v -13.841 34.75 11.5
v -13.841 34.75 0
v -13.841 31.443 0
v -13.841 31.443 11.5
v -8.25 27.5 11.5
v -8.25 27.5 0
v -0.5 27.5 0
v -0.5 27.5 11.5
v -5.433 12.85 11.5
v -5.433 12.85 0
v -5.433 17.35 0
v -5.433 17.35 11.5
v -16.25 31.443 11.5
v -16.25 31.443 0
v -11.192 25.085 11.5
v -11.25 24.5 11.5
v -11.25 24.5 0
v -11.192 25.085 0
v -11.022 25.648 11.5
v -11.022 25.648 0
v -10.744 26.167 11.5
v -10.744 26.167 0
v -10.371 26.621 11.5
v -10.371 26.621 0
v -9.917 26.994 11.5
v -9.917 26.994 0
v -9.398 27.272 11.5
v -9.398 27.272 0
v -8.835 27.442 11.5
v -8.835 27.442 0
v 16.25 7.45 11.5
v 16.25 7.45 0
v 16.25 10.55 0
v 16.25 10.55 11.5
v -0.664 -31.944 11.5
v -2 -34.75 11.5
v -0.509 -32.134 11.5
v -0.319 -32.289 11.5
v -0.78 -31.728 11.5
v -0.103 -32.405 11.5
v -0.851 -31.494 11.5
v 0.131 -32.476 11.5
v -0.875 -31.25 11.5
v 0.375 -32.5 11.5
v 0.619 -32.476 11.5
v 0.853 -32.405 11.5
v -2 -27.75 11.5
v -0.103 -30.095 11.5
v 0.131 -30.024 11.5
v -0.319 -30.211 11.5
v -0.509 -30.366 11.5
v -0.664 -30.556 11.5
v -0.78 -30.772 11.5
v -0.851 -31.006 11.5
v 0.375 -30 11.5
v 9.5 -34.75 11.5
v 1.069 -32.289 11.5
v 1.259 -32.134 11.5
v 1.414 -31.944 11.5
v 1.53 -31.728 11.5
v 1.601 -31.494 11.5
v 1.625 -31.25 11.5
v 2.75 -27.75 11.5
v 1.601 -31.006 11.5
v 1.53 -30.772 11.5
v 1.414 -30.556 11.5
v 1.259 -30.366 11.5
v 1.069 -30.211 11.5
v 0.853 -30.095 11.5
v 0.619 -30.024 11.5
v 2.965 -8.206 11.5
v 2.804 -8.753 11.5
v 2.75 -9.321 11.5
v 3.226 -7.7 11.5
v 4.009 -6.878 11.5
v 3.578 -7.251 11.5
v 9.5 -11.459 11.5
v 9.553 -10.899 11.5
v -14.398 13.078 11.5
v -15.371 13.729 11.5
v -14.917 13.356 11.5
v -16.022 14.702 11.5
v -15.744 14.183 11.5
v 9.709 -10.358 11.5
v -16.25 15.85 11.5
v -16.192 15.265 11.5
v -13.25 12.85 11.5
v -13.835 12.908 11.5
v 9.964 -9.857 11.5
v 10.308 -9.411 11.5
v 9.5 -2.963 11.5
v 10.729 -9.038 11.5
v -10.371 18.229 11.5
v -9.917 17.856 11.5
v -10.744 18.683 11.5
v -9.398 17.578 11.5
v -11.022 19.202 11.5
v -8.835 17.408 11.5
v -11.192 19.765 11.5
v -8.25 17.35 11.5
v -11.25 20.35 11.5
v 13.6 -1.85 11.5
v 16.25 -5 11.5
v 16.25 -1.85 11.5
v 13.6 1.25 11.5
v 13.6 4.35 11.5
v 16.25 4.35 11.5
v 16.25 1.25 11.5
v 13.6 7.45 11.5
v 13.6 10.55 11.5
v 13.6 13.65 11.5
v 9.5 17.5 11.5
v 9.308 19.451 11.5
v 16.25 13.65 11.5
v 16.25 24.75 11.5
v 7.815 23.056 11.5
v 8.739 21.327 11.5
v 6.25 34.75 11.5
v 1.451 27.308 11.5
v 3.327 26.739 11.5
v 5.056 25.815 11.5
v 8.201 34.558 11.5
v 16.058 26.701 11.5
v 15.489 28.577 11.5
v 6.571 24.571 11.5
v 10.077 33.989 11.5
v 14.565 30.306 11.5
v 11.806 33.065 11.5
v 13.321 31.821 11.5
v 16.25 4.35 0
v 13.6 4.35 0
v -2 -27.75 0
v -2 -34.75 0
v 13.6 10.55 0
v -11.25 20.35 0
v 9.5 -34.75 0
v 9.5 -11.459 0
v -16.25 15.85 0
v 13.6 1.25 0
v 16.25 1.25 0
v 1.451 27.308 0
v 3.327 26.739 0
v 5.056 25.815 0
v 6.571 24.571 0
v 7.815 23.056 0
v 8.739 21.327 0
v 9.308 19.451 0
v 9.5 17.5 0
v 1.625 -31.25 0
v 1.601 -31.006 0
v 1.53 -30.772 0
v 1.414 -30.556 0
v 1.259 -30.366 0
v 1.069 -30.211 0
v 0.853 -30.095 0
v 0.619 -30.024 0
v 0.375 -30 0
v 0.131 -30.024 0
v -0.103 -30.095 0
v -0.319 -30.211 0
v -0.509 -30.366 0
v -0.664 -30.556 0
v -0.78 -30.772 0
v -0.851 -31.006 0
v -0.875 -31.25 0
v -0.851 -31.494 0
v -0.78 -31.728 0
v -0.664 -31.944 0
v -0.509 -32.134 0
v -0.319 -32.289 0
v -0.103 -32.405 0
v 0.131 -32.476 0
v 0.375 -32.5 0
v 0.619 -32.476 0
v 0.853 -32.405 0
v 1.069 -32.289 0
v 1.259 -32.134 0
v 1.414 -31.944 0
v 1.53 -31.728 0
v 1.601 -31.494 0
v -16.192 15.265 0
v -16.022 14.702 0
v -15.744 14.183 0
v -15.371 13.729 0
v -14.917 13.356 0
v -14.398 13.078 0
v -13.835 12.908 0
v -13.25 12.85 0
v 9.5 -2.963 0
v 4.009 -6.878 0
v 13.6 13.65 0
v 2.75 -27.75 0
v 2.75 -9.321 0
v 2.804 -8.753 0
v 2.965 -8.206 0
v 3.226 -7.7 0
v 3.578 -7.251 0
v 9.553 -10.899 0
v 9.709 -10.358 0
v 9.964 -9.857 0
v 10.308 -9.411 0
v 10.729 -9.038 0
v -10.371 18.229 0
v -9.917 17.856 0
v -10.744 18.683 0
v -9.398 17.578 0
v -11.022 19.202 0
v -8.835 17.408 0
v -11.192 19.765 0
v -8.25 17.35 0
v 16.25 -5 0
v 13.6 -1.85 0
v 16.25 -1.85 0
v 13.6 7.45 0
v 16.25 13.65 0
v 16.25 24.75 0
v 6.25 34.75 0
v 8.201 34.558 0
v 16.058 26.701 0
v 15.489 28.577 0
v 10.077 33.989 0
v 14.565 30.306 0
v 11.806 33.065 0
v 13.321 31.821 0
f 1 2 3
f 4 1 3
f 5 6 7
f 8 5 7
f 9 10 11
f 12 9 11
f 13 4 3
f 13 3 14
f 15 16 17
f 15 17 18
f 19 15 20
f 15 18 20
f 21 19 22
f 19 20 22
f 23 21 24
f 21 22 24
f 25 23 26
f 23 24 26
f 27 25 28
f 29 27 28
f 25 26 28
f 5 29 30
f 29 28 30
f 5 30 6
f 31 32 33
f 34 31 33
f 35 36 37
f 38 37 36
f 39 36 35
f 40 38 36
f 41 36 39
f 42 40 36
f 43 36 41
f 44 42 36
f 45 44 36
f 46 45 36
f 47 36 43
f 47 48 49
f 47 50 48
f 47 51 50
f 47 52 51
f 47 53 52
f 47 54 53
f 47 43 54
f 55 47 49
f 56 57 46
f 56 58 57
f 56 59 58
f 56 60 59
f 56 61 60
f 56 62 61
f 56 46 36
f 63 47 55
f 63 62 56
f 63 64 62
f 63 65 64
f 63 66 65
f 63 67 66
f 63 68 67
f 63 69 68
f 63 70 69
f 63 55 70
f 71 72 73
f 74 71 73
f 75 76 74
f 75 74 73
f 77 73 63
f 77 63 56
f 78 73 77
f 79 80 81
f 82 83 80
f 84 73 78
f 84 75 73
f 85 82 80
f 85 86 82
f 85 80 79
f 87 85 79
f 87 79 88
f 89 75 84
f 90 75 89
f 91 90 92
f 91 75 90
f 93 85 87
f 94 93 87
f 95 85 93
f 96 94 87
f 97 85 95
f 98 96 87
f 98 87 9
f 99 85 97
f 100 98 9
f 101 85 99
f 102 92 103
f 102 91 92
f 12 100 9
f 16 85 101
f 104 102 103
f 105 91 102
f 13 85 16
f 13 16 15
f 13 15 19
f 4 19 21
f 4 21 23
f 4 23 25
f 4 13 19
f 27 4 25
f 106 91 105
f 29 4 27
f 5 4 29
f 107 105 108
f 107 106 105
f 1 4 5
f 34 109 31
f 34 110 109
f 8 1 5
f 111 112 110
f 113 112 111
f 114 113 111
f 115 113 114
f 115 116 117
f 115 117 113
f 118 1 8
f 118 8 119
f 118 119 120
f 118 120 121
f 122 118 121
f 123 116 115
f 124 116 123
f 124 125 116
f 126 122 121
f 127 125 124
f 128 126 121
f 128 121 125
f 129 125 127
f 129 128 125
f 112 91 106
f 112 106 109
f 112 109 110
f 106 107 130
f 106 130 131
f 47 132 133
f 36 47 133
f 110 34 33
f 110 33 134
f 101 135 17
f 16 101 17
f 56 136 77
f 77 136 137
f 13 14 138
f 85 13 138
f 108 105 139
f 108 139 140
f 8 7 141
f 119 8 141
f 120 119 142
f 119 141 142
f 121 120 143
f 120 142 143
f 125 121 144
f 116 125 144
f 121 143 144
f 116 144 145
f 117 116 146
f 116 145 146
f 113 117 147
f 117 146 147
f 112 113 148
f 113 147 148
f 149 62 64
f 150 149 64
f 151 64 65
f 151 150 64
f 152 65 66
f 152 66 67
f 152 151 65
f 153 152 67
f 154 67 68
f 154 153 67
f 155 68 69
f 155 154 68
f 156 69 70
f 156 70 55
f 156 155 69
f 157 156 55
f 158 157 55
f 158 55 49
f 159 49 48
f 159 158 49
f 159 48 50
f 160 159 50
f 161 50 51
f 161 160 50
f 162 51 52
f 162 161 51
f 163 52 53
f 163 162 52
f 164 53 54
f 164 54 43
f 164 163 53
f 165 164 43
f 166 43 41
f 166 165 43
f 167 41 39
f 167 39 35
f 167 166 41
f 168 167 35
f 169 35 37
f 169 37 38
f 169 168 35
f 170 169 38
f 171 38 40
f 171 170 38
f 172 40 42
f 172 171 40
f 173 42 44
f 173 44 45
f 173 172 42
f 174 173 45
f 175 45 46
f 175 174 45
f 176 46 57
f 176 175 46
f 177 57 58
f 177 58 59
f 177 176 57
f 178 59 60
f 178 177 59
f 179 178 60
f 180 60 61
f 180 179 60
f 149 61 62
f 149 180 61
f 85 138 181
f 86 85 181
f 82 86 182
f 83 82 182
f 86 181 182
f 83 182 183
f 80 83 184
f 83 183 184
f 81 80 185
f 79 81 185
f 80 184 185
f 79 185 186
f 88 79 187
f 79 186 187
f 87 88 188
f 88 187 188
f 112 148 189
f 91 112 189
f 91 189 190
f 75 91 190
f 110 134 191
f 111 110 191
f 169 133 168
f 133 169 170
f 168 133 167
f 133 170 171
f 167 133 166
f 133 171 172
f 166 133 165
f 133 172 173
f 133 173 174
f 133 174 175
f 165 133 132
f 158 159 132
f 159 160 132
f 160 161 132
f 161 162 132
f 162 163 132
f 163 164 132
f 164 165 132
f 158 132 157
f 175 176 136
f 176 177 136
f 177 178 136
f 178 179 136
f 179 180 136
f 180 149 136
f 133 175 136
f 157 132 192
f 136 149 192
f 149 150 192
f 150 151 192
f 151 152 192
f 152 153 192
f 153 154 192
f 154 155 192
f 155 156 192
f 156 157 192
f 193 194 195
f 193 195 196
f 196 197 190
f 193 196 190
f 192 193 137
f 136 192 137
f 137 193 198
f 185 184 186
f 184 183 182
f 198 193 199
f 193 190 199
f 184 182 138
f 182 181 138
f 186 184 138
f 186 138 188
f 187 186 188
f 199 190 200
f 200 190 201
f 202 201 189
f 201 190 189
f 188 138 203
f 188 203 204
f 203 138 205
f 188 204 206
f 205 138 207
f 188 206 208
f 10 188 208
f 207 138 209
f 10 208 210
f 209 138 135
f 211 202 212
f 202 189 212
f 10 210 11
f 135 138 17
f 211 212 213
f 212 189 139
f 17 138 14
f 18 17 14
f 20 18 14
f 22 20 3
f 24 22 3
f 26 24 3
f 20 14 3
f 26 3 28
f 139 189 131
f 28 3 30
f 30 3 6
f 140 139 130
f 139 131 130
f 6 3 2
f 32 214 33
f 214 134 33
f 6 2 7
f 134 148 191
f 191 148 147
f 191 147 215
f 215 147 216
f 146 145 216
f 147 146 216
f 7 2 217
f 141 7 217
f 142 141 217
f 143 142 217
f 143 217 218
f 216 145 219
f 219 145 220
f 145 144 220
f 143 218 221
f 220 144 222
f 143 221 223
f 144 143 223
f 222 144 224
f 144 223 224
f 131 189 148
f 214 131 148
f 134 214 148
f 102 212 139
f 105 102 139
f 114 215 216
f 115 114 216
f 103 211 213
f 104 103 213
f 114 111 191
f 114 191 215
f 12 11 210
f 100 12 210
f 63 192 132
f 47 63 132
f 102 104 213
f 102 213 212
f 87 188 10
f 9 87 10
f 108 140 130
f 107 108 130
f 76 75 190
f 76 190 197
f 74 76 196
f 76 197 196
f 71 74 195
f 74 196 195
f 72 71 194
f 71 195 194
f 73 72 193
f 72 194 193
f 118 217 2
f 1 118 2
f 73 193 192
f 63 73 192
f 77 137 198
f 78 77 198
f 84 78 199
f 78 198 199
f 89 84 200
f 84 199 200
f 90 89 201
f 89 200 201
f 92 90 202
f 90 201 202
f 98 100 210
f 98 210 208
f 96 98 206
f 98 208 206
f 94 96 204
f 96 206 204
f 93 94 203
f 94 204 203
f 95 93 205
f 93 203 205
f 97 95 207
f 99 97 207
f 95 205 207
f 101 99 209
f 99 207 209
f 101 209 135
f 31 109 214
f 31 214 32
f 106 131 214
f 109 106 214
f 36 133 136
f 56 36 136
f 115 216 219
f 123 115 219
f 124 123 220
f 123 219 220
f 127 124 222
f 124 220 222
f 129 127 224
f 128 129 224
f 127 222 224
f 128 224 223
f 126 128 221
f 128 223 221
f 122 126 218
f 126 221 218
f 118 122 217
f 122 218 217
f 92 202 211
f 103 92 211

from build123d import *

# Parameters (mm, degrees)
F0_R     = 1.25
F1_DEPTH = 11.5


with BuildPart() as f1:
    # F0 (on Top) → F1 (new body)
    with BuildSketch(Plane.XY):
        with BuildLine():
            Line((-2, -34.75), (4.75, -34.75))
            Line((4.75, -34.75), (9.5, -34.75))
            Line((9.5, -34.75), (9.5, -27.75))
            Line((9.5, -27.75), (9.5, -11.459255))
            ThreePointArc((9.5, -11.459255), (9.824846, -10.10148), (10.729036, -9.03775))
            Line((10.729036, -9.03775), (16.25, -5))
            Line((16.25, -5), (16.25, -1.85))
            Line((16.25, -1.85), (13.6, -1.85))
            Line((13.6, -1.85), (13.6, 1.25))
            Line((13.6, 1.25), (16.25, 1.25))
            Line((16.25, 1.25), (16.25, 4.35))
            Line((16.25, 4.35), (13.6, 4.35))
            Line((13.6, 4.35), (13.6, 7.45))
            Line((13.6, 7.45), (16.25, 7.45))
            Line((16.25, 7.45), (16.25, 10.55))
            Line((16.25, 10.55), (13.6, 10.55))
            Line((13.6, 10.55), (13.6, 13.65))
            Line((13.6, 13.65), (16.25, 13.65))
            Line((16.25, 13.65), (16.25, 24.75))
            ThreePointArc((16.25, 24.75), (13.321068, 31.821068), (6.25, 34.75))
            Line((6.25, 34.75), (-13.841292, 34.75))
            Line((-13.841292, 34.75), (-13.841292, 31.442884))
            Line((-13.841292, 31.442884), (-16.25, 31.442884))
            Line((-16.25, 31.442884), (-16.25, 15.85))
            ThreePointArc((-16.25, 15.85), (-15.37132, 13.72868), (-13.25, 12.85))
            Line((-13.25, 12.85), (-5.433433, 12.85))
            Line((-5.433433, 12.85), (-5.433433, 17.35))
            Line((-5.433433, 17.35), (-8.25, 17.35))
            ThreePointArc((-8.25, 17.35), (-10.37132, 18.22868), (-11.25, 20.35))
            Line((-11.25, 20.35), (-11.25, 24.5))
            ThreePointArc((-11.25, 24.5), (-10.37132, 26.62132), (-8.25, 27.5))
            Line((-8.25, 27.5), (-0.5, 27.5))
            ThreePointArc((-0.5, 27.5), (6.571068, 24.571068), (9.5, 17.5))
            Line((9.5, 17.5), (9.5, -2.963436))
            Line((9.5, -2.963436), (4.008641, -6.877843))
            ThreePointArc((4.008641, -6.877843), (3.083159, -7.946693), (2.75, -9.320724))
            Line((2.75, -9.320724), (2.75, -9.936604))
            Line((2.75, -9.936604), (2.75, -27.75))
            Line((2.75, -27.75), (-2, -27.75))
            Line((-2, -27.75), (-2, -34.75))
        make_face()
        with Locations((0.375, -31.25)):
            Circle(F0_R, mode=Mode.SUBTRACT)
    extrude(amount=F1_DEPTH)


solid = f1.part
